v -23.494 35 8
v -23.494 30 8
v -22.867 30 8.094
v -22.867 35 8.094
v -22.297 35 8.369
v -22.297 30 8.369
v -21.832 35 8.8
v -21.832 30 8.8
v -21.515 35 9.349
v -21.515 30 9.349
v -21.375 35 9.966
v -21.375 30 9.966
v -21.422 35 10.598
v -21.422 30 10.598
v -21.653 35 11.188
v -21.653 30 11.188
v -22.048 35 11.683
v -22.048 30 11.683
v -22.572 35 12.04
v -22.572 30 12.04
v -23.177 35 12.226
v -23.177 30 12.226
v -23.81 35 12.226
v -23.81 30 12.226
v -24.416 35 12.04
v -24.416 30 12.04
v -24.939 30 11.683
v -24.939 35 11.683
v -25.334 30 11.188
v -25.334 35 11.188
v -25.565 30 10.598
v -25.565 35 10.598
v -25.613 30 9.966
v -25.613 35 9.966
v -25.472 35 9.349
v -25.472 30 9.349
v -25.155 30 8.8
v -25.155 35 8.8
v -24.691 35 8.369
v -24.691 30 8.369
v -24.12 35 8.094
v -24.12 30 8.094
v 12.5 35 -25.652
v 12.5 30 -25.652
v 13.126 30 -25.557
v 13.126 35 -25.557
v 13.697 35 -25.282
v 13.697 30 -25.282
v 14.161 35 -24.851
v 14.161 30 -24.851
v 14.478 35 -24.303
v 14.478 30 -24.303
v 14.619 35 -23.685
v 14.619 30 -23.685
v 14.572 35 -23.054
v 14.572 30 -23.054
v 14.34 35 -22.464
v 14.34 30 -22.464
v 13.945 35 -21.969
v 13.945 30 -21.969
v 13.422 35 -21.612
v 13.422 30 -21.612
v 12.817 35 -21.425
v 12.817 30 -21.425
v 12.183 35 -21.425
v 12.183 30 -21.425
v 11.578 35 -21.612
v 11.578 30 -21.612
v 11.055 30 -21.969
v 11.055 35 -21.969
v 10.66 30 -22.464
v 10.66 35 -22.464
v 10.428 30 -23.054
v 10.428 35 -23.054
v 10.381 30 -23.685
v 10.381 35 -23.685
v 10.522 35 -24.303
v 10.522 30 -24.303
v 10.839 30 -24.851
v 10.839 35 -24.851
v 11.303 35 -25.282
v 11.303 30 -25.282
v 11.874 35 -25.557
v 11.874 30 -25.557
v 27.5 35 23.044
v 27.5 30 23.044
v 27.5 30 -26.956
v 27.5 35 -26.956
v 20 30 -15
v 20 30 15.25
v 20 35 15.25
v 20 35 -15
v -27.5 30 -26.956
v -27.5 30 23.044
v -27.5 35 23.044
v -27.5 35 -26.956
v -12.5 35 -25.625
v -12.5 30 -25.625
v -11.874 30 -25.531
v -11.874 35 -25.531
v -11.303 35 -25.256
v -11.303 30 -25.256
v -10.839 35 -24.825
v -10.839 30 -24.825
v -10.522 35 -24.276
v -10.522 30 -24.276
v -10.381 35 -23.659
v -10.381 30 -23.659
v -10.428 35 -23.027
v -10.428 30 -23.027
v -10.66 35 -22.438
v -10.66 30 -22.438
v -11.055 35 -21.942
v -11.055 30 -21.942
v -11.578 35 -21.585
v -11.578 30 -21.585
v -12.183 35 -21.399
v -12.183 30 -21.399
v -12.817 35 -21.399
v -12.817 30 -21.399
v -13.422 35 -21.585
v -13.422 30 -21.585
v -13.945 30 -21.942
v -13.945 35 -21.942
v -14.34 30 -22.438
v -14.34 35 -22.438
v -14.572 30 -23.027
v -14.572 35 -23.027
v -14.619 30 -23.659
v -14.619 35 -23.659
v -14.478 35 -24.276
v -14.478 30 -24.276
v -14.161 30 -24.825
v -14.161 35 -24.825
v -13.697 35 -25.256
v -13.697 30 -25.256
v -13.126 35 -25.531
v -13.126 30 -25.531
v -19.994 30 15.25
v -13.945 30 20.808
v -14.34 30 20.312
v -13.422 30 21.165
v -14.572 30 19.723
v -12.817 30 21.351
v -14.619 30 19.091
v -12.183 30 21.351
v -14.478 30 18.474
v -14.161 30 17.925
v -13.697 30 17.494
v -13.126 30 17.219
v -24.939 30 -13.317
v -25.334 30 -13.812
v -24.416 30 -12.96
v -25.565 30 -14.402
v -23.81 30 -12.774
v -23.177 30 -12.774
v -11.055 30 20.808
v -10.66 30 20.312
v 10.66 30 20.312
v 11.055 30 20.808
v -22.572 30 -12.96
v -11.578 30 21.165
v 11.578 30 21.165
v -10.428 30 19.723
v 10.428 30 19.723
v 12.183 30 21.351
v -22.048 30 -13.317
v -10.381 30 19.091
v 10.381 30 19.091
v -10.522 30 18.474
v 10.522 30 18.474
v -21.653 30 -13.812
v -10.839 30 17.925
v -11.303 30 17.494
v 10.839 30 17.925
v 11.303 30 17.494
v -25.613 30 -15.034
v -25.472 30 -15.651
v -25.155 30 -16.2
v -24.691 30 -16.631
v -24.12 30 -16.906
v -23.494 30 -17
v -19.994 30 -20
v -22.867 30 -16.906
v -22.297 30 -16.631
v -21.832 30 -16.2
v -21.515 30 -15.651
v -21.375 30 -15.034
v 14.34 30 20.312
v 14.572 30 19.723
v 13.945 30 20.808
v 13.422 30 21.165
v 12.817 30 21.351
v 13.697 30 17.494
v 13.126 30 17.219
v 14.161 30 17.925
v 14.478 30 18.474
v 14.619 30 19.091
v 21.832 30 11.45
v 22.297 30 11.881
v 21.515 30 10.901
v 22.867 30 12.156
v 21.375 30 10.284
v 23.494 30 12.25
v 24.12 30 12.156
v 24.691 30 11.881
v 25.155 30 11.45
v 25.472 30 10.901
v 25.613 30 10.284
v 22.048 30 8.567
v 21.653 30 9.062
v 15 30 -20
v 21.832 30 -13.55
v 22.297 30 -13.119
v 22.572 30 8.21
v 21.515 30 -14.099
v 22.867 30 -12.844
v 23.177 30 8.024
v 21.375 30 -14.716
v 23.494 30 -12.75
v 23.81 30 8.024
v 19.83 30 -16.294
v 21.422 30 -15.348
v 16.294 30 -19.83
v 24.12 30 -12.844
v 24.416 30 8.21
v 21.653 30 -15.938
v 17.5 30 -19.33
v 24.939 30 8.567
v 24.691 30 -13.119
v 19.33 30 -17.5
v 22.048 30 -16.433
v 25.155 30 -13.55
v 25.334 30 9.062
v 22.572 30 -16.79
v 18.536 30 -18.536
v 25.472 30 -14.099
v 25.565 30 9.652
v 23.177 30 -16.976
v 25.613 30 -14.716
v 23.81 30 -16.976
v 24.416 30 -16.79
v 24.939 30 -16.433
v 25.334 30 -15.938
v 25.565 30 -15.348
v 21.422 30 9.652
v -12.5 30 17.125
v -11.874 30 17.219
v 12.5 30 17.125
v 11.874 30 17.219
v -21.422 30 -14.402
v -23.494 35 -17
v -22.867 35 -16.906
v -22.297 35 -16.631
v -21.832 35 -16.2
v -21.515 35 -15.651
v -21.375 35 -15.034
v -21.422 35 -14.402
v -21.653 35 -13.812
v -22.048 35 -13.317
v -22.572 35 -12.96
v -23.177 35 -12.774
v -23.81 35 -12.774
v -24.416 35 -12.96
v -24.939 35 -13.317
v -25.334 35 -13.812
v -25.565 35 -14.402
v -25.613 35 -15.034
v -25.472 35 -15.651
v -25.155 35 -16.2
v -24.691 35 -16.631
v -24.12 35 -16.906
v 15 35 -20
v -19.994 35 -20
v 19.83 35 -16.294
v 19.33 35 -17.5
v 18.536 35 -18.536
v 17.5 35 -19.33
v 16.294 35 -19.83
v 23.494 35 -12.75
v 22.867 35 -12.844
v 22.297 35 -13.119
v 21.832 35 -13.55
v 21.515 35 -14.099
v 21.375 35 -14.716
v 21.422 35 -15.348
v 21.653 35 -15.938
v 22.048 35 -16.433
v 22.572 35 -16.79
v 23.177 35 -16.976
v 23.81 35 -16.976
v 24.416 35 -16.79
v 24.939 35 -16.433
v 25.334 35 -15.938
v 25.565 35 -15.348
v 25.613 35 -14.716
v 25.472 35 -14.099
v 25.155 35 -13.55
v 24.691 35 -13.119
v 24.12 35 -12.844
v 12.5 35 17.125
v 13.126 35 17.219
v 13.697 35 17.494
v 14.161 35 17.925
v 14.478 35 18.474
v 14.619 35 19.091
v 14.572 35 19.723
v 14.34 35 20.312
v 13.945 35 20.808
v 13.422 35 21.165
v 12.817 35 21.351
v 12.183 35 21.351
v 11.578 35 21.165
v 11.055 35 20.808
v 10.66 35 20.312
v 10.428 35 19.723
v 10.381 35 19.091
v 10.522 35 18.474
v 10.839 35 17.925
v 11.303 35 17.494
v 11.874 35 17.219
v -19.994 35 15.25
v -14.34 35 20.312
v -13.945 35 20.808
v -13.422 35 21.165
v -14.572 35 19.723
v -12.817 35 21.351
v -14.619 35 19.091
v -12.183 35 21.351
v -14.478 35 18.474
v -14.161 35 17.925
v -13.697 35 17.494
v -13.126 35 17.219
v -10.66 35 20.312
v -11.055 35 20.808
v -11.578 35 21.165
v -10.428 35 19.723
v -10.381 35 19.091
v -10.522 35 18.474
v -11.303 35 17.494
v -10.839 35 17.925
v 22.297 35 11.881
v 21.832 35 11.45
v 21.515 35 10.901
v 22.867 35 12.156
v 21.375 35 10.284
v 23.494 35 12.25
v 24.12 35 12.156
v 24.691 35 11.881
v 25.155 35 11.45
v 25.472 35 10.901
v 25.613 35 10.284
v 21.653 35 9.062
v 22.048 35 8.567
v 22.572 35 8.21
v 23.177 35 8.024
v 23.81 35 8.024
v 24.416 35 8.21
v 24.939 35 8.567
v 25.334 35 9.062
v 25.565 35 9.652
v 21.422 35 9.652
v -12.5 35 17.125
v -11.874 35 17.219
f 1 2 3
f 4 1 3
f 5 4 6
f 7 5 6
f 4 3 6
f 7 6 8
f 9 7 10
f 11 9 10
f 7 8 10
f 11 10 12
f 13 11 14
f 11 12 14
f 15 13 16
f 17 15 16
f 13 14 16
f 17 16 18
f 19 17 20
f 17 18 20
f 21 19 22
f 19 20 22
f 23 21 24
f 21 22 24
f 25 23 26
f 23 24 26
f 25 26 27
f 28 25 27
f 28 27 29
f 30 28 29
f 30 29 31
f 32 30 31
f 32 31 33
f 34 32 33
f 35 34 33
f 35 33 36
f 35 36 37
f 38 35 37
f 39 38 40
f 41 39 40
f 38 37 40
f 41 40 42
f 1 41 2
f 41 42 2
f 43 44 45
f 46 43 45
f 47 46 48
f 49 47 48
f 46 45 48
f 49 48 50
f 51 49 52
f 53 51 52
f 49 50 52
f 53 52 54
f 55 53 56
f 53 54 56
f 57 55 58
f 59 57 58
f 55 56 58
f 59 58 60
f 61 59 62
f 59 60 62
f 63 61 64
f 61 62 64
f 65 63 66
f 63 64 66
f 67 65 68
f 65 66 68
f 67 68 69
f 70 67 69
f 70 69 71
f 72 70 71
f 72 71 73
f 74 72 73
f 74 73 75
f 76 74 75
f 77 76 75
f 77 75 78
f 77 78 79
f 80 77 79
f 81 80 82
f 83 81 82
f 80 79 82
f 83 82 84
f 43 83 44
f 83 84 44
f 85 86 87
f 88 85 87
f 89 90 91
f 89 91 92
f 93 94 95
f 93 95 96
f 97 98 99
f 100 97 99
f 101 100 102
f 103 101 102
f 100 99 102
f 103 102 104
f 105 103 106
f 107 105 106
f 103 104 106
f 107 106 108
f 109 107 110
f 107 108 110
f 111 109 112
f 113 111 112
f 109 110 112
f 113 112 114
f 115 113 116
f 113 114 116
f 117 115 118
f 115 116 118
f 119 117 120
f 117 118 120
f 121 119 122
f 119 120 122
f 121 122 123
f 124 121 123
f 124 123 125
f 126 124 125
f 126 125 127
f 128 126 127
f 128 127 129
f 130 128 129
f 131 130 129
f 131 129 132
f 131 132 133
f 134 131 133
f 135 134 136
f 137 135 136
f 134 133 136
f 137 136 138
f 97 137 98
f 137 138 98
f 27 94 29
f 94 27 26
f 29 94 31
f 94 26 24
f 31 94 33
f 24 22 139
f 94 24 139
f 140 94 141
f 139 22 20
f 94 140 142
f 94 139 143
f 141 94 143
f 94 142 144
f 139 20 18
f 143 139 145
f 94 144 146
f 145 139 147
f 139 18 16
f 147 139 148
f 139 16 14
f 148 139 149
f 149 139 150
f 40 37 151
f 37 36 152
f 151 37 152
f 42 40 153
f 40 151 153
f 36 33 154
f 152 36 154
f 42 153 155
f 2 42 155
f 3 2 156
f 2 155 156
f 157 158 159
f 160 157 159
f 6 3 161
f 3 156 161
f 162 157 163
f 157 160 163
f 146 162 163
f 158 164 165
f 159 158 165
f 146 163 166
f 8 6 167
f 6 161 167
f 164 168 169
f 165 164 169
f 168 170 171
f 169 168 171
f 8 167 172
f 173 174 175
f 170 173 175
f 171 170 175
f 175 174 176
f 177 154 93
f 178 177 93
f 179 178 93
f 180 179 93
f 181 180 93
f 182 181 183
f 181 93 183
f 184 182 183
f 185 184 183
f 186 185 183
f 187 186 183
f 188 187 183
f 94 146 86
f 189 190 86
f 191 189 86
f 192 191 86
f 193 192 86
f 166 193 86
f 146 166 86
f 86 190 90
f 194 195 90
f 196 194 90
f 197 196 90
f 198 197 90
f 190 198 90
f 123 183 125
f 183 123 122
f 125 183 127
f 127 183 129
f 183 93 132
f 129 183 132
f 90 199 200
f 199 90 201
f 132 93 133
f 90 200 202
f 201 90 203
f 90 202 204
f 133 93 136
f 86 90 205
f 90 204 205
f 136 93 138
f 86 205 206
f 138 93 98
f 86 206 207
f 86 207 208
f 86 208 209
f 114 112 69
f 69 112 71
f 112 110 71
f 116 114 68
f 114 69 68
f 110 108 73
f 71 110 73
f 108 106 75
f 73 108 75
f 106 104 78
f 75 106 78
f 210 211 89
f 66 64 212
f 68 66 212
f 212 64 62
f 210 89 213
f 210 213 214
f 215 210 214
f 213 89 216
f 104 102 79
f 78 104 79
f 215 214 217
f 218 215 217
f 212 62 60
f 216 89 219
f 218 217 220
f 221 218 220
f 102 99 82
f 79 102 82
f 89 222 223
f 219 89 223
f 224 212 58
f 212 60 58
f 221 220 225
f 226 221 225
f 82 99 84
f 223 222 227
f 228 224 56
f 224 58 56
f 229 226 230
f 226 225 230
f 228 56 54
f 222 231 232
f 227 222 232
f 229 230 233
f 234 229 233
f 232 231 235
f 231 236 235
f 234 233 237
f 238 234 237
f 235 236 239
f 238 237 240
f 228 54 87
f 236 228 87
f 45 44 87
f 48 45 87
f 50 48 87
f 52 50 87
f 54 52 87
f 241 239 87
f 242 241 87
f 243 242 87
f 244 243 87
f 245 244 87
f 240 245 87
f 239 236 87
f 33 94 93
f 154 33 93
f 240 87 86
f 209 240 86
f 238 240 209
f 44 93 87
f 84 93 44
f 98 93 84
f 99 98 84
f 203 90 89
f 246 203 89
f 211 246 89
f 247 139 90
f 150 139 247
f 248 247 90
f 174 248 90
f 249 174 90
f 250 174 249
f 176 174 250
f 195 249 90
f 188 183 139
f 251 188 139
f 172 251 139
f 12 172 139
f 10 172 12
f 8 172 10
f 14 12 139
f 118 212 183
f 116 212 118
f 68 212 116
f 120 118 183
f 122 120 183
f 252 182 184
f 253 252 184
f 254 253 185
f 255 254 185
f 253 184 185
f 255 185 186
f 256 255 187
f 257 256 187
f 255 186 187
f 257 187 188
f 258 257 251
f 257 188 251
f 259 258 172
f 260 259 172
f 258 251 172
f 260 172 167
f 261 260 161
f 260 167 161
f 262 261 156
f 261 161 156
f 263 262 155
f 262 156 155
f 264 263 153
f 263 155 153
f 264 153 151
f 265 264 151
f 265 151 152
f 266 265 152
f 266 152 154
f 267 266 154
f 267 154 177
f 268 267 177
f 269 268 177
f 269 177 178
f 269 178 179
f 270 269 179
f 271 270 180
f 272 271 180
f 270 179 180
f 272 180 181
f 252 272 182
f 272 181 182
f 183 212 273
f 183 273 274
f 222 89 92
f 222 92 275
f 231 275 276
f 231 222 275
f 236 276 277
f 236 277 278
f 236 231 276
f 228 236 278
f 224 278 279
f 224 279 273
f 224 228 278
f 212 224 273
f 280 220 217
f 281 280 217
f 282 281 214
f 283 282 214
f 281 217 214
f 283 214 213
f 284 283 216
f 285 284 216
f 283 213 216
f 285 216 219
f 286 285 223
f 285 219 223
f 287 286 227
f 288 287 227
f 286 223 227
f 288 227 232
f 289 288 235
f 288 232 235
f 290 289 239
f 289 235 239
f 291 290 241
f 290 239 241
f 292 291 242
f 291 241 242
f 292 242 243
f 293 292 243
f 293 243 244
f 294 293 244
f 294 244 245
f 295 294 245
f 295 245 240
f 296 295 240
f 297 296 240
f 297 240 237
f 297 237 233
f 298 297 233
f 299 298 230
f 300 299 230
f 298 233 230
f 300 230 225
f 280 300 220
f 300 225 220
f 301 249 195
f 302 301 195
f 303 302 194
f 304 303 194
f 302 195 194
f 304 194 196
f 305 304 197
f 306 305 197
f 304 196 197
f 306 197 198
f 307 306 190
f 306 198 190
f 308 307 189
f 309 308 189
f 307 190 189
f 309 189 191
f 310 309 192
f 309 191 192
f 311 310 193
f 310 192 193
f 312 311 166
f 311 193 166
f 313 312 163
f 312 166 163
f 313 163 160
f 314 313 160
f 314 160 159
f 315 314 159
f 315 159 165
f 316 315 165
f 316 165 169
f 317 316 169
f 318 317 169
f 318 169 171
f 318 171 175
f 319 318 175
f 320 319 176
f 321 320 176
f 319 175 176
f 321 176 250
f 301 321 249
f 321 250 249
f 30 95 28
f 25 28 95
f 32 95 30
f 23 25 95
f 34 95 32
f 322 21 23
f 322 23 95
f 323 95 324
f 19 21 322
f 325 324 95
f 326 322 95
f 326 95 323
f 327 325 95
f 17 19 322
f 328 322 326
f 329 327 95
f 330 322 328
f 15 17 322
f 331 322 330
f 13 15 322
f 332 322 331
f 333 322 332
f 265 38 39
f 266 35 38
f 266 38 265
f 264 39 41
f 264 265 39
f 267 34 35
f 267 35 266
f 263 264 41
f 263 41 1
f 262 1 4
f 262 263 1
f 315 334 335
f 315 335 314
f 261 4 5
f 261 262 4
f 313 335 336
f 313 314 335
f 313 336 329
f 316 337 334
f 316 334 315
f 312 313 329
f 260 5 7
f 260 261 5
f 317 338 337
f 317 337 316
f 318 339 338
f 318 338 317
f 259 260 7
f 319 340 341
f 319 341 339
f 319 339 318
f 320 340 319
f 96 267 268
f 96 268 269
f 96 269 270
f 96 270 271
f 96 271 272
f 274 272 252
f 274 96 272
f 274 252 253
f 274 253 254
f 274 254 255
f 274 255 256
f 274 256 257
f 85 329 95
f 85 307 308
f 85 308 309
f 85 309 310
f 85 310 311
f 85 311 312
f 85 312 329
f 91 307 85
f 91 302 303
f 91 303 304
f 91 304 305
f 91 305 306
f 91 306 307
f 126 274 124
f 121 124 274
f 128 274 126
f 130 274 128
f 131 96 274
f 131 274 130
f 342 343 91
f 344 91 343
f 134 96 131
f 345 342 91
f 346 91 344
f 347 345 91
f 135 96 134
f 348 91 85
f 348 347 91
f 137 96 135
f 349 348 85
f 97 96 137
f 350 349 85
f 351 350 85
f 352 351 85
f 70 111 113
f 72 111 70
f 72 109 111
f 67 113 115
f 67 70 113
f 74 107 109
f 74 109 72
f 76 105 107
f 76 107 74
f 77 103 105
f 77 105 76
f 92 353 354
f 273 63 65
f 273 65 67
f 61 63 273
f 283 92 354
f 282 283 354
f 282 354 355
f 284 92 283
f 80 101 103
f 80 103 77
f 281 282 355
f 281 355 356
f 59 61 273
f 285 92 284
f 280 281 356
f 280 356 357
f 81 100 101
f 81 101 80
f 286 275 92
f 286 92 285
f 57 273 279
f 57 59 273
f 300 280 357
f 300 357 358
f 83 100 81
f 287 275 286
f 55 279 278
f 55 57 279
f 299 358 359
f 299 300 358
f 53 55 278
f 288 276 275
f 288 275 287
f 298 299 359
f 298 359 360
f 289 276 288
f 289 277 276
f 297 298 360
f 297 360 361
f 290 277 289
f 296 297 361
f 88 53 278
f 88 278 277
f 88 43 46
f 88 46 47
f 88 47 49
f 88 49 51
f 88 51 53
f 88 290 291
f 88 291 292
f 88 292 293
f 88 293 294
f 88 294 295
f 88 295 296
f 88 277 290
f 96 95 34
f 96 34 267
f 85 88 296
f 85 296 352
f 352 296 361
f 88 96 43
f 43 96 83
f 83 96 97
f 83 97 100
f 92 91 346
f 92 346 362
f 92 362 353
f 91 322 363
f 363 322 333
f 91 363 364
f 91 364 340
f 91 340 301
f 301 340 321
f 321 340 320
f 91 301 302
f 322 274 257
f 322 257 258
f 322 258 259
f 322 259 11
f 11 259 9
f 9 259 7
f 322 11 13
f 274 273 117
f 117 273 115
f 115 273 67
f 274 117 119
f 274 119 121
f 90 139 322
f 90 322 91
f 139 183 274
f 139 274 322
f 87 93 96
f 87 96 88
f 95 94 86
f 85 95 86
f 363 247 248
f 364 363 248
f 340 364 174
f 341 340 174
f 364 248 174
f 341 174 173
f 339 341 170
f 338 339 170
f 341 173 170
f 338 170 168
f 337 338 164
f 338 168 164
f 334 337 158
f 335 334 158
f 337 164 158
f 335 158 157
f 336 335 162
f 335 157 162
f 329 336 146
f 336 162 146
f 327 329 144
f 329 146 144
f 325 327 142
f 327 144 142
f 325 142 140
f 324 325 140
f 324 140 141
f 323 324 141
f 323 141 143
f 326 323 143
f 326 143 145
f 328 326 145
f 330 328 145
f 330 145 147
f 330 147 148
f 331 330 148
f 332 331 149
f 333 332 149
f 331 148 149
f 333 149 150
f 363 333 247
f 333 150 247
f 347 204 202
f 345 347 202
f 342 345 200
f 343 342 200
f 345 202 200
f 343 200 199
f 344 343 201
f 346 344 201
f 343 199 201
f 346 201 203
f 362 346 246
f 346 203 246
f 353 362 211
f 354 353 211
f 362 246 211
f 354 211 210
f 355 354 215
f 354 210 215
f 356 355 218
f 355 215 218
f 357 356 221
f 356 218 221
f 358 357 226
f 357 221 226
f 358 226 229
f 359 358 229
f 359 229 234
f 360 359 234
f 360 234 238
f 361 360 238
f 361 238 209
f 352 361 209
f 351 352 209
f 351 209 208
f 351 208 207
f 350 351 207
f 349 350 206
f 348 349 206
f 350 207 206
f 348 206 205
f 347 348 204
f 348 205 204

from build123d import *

# Parameters (mm, degrees)
CROQUIS1_R                              = 15.25
CROQUIS1_R_2                            = 2.125
SOPORTE_CAJA_REDUCTORA_DEPTH            = 20
CROQUIS3_R                              = 2.125
CORTAR_EXTRUIR1_DEPTH                   = 51.423828692
REDONDEO1_R                             = 5
BOSS_EXTRUDE1_DEPTH                     = 20
CUT_EXTRUDE1_REACH                      = 55.852
SKETCH2_R                               = 1.625
CUT_EXTRUDE2_DEPTH                      = 2
SKETCH4_R                               = 1.625
CUT_EXTRUDE3_DEPTH                      = 63.291652731
CUT_EXTRUDE4_START                      = -4.5
CUT_EXTRUDE4_DEPTH                      = 2
CROQUIS6_W                              = 4.75
CROQUIS6_H                              = 4.75
CORTAR_EXTRUIR17_DEPTH                  = 42.231056256
CROQUIS7_W                              = 60
CROQUIS7_H                              = 20
CORTAR_EXTRUIR18_DEPTH                  = 51.423828692
SALIENTE_EXTRUIR2_DEPTH                 = 49
SOPORTE_START                           = -15
SOPORTE_MOTOR_DEPTH                     = 15
CROQUIS12_R                             = 2.125
AGUJEROS_DE_SUJECION_A_BASE_DEPTH       = 84.087679592
TUERCA_START                            = -4
TUERCA_AGUJERO_DE_SUJECION_A_BASE_DEPTH = 10
SALIENTE_EXTRUIR4_DEPTH                 = 15
CORTAR_EXTRUIR19_DEPTH                  = 25
CROQUIS14_W                             = 50
CROQUIS14_H                             = 118
CORTAR_EXTRUIR22_DEPTH                  = 146.556045907
CROQUIS15_W                             = 10
CROQUIS15_H                             = 7
CORTAR_EXTRUIR23_DEPTH                  = 42.231056256
CORTAR_EXTRUIR24_DEPTH                  = 42.231056256
CROQUIS18_W                             = 40
CROQUIS18_H                             = 10
CORTAR_EXTRUIR25_DEPTH                  = 44.27311521
SALIENTE_EXTRUIR5_DEPTH                 = 10
CROQUIS20_R                             = 1
CORTAR_EXTRUIR26_DEPTH                  = 49.229270158
CORTAR_EXTRUIR27_REACH                  = 62.959
CORTAR_EXTRUIR27_END_RADIUS             = 15.25
CROQUIS21_R                             = 1.625
CROQUIS22_R                             = 2.125
CROQUIS22_R_2                           = 1
SALIENTE_EXTRUIR6_DEPTH                 = 10
CROQUIS23_R                             = 1.625
CORTAR_EXTRUIR28_DEPTH                  = 52.269508521
CORTAR_EXTRUIR29_START                  = -3
CORTAR_EXTRUIR29_DEPTH                  = 10
SALIENTE_EXTRUIR7_DEPTH                 = 10
CORTAR_EXTRUIR30_REACH                  = 72.235
CROQUIS27_R                             = 1.625
CORTAR_EXTRUIR31_REACH                  = 75.235
CORTAR_EXTRUIR31_START                  = -3
CORTAR_EXTRUIR32_REACH                  = 58.612
CROQUIS29_R                             = 1.625
CORTAR_EXTRUIR33_REACH                  = 61.112
CORTAR_EXTRUIR33_START                  = -2.5
CROQUIS35_W                             = 13.305418987
CROQUIS35_H                             = 6.826864192
CORTAR_EXTRUIR34_DEPTH                  = 63.931555098
CORTAR_EXTRUIR34_DEPTH_BACK             = 63.931555098
CORTAR_EXTRUIR35_START                  = -3
CORTAR_EXTRUIR35_DEPTH                  = 10
SALIENTE_EXTRUIR8_DEPTH                 = 10
SALIENTE_EXTRUIR9_DEPTH                 = 13
SALIENTE_EXTRUIR10_DEPTH                = 3
CROQUIS40_W                             = 106.583537839
CROQUIS40_H                             = 47.391515964
CORTAR_EXTRUIR36_DEPTH                  = 80.887064817
CORTAR_EXTRUIR36_DEPTH_BACK             = 80.887064817
CORTAR_EXTRUIR37_DEPTH                  = 67.2524009
CORTAR_EXTRUIR37_DEPTH_BACK             = 67.2524009
CORTAR_EXTRUIR38_DEPTH                  = 79.704784639
CORTAR_EXTRUIR38_DEPTH_BACK             = 79.704784639
SALIENTE_EXTRUIR11_DEPTH                = 10
CORTAR_EXTRUIR39_DEPTH                  = 63.9908649
CROQUIS45_W                             = 31.470301378
CROQUIS45_H                             = 10
CROQUIS45_R                             = 1.625
SALIENTE_EXTRUIR12_DEPTH                = 2.5
SALIENTE_EXTRUIR13_DEPTH                = 10
CORTAR_EXTRUIR40_START                  = -2
CROQUIS47_R                             = 1.625
CORTAR_EXTRUIR40_DEPTH                  = 10
CORTAR_EXTRUIR41_START                  = -12
CROQUIS48_R                             = 1.625
CORTAR_EXTRUIR41_DEPTH                  = 12
CROQUIS49_W                             = 34.796066513
CROQUIS49_H                             = 42.211026982
CORTAR_EXTRUIR42_DEPTH                  = 52.795622989
CORTAR_EXTRUIR42_DEPTH_BACK             = 52.795622989
CROQUIS51_R                             = 15.25
CROQUIS51_R_2                           = 14.25
SALIENTE_EXTRUIR14_DEPTH                = 10
CORTAR_EXTRUIR43_DEPTH                  = 10
CORTAR_EXTRUIR44_DEPTH                  = 10
CORTAR_EXTRUIR45_DEPTH                  = 10
SALIENTE_EXTRUIR15_DEPTH                = 10
CROQUIS56_W                             = 55
CROQUIS56_H                             = 50
SALIENTE_EXTRUIR16_DEPTH                = 5
CROQUIS57_W                             = 42.651963039
CROQUIS57_H                             = 12.802181648
CORTAR_EXTRUIR46_DEPTH                  = 71.545387859
CORTAR_EXTRUIR46_DEPTH_BACK             = 71.545387859
CROQUIS58_R                             = 2.125
CORTAR_EXTRUIR47_DEPTH                  = 5


with BuildPart() as part:
    # Croquis1 → Soporte caja reductora (new body)
    with BuildSketch(Plane(origin=(0, 0, 0), x_dir=(1, 0, 0), z_dir=(0, 1, 0))):
        Polygon((-30, -15.25), (-20, -15.25), (-20, -20), (20, -20), (20, -15.25), (30, -15.25), (30, -7.25), (20, -4.25), (20, 20), (-20, 20), (-20, -4.25), (-30, -7.25), align=None)
        with Locations(Location((0, 0, 0), (0, 0, 270))):
            Circle(CROQUIS1_R, mode=Mode.SUBTRACT)
        with Locations(Location((-15, 15, 0), (0, 0, 270))):
            Circle(CROQUIS1_R_2, mode=Mode.SUBTRACT)
        with Locations(Location((15, 15, 0), (0, 0, 270))):
            Circle(CROQUIS1_R_2, mode=Mode.SUBTRACT)
    extrude(amount=-SOPORTE_CAJA_REDUCTORA_DEPTH)

    # Croquis3 → Cortar-Extruir1 (cut, through all)
    with BuildSketch(Plane.XY.offset(15.25)):
        with Locations((-23.5, -10)):
            Circle(CROQUIS3_R)
        with Locations((23.5, -10)):
            Circle(CROQUIS3_R)
    extrude(amount=-CORTAR_EXTRUIR1_DEPTH, mode=Mode.SUBTRACT)

    # Redondeo1
    redondeo1_edges = [part.edges().sort_by_distance(p)[0] for p in [
        (-20, -10, -20),
        (20, -10, -20),
    ]]
    fillet(redondeo1_edges, radius=REDONDEO1_R)

    # Sketch1 → Boss-Extrude1 (add)
    with BuildSketch(Plane(origin=(0, 0, 0), x_dir=(1, 0, 0), z_dir=(0, 1, 0))):
        with BuildLine():
            Line((25.5, 15), (20, 15))
            ThreePointArc((20, 15), (18.535533906, 18.535533906), (15, 20))
            Line((15, 20), (30, 20))
            Line((30, 20), (30, 8))
            Line((30, 8), (25.5, 8))
            Line((25.5, 8), (25.5, 15))
        make_face()
    extrude(amount=-BOSS_EXTRUDE1_DEPTH)

    # Sketch2 → Cut-Extrude1 (cut, up to next)
    with BuildSketch(Plane(origin=(0, 0, -20), x_dir=(-1, 0, 0), z_dir=(0, 0, -1)), mode=Mode.PRIVATE) as cut_extrude1_sk1:
        with Locations((-22.75, -10)):
            Circle(SKETCH2_R)
    cut_extrude1_tool1 = extrude(cut_extrude1_sk1.sketch, amount=-CUT_EXTRUDE1_REACH, mode=Mode.PRIVATE) & part.part
    add(cut_extrude1_tool1.solids().sort_by_distance((22.75, -10, -20))[0], mode=Mode.SUBTRACT)

    # Sketch3 → Cut-Extrude2 (cut)
    with BuildSketch(Plane.XY.offset(-15)):
        Polygon((20, -11.58771324), (22.75, -13.175426481), (25.5, -11.58771324), (25.5, -8.41228676), (22.75, -6.824573519), (20, -8.41228676), align=None)
    extrude(amount=-CUT_EXTRUDE2_DEPTH, mode=Mode.SUBTRACT)

    # Sketch4 → Cut-Extrude3 (cut, through all)
    with BuildSketch(Plane.ZY.offset(-25.5)):
        with Locations((-12.25, -10)):
            Circle(SKETCH4_R)
    extrude(amount=-CUT_EXTRUDE3_DEPTH, mode=Mode.SUBTRACT)

    # Sketch5 → Cut-Extrude4 (cut)
    with BuildSketch(Plane(origin=(30, 0, 0), x_dir=(0, 0, -1), z_dir=(1, 0, 0)).offset(CUT_EXTRUDE4_START)):
        Polygon((15, -11.58771324), (15, -8.41228676), (12.25, -6.824573519), (9.5, -8.41228676), (9.5, -11.58771324), (12.25, -13.175426481), align=None)
    extrude(amount=CUT_EXTRUDE4_DEPTH, mode=Mode.SUBTRACT)

    # Croquis6 → Cortar-Extruir17 (cut, through all)
    with BuildSketch(Plane(origin=(0, 0, 0), x_dir=(1, 0, 0), z_dir=(0, 1, 0))):
        Polygon((0, -15.25), (-15.25, -15.25), (-15.25, -20), (15.25, -20), (15.25, -15.25), align=None)
        with Locations((-17.625, -17.625)):
            Rectangle(CROQUIS6_W, CROQUIS6_H)
        with BuildLine():
            ThreePointArc((0, -15.25), (-10.783378413, -10.783378413), (-15.25, 0))
            Line((-15.25, 0), (-15.25, -15.25))
            Line((-15.25, -15.25), (0, -15.25))
        make_face()
        with BuildLine():
            Line((15.25, -15.25), (15.25, 0))
            ThreePointArc((15.25, 0), (10.783378413, -10.783378413), (0, -15.25))
            Line((0, -15.25), (15.25, -15.25))
        make_face()
        with Locations((17.625, -17.625)):
            Rectangle(CROQUIS6_W, CROQUIS6_H)
    extrude(amount=-CORTAR_EXTRUIR17_DEPTH, mode=Mode.SUBTRACT)


with BuildPart() as body_2:
    # Simetría1: mirrored copy
    add(part.part.mirror(Plane.ZX))

    # Croquis8 → Saliente-Extruir2 (add)
    with BuildSketch(Plane(origin=(0, 20, 0), x_dir=(1, 0, 0), z_dir=(0, 1, 0))):
        with BuildLine():
            Line((-12.664515522, 20), (-11.040489496, 13.939052358))
            Line((-11.040489496, 13.939052358), (-10.315162126, 11.232093763))
            ThreePointArc((-10.315162126, 11.232093763), (0, 15.25), (10.315162126, 11.232093763))
            Line((10.315162126, 11.232093763), (10.817418481, 13.87928066))
            Line((10.817418481, 13.87928066), (11.978715476, 20))
            Line((11.978715476, 20), (-12.664515522, 20))
        make_face()
    extrude(amount=SALIENTE_EXTRUIR2_DEPTH)

    # Croquis9 → Soporte motor (add)
    with BuildSketch(Plane(origin=(0, 69, 0), x_dir=(1, 0, 0), z_dir=(0, 1, 0)).offset(SOPORTE_START)):
        with BuildLine():
            Line((-20, 15), (-20, -4.25))
            Line((-20, -4.25), (-30, -7.25))
            Line((-30, -7.25), (-30, -15.25))
            Line((-30, -15.25), (0, -15.25))
            Line((0, -15.25), (0, -14.75))
            ThreePointArc((0, -14.75), (-10.429825023, 10.429825023), (14.75, 0))
            Line((14.75, 0), (20, 0))
            Line((20, 0), (20, 13.936837101))
            Line((20, 13.936837101), (12.664515522, 20))
            Line((12.664515522, 20), (-15, 20))
            ThreePointArc((-15, 20), (-18.535533906, 18.535533906), (-20, 15))
        make_face()
    extrude(amount=-SOPORTE_MOTOR_DEPTH)

    # Croquis12 → Agujeros de sujecion a base (cut, through all)
    with BuildSketch(Plane.XY.offset(15.25)):
        with Locations((-23.5, 46.5)):
            Circle(CROQUIS12_R)
    extrude(amount=-AGUJEROS_DE_SUJECION_A_BASE_DEPTH, mode=Mode.SUBTRACT)

    # Croquis13 → Tuerca Agujero de sujecion a base (cut)
    with BuildSketch(Plane.XY.offset(15.25).offset(TUERCA_START)):
        Polygon((-20, 44.479274058), (-20, 48.520725942), (-23.5, 50.541451884), (-27, 48.520725942), (-27, 44.479274058), (-23.5, 42.458548116), align=None)
    extrude(amount=-TUERCA_AGUJERO_DE_SUJECION_A_BASE_DEPTH, mode=Mode.SUBTRACT)

    # Croquis10 → Saliente-Extruir4 (add)
    with BuildSketch(Plane(origin=(0, 69, 0), x_dir=(1, 0, 0), z_dir=(0, 1, 0))):
        with BuildLine():
            ThreePointArc((10.315162126, 11.232093763), (0, 15.25), (-10.315162126, 11.232093763))
            Line((-10.315162126, 11.232093763), (-10.16850369, 10.684757026))
            ThreePointArc((-10.16850369, 10.684757026), (0, 14.75), (10.16850369, 10.684757026))
            Line((10.16850369, 10.684757026), (10.315162126, 11.232093763))
        make_face()
    extrude(amount=-SALIENTE_EXTRUIR4_DEPTH)

    # Croquis11 → Cortar-Extruir19 (cut)
    with BuildSketch(Plane.XZ):
        with BuildLine():
            Line((15.25, 4.25), (20, 4.25))
            Line((20, 4.25), (21.972856468, 4.84185694))
            ThreePointArc((21.972856468, 4.84185694), (19.948931102, 10.40625523), (16.543503257, 15.25))
            Line((16.543503257, 15.25), (15.25, 15.25))
            Line((15.25, 15.25), (15.25, 4.25))
        make_face()
        with BuildLine():
            Line((21.972856468, 4.84185694), (30, 7.25))
            Line((30, 7.25), (30, 15.25))
            Line((30, 15.25), (16.543503257, 15.25))
            ThreePointArc((16.543503257, 15.25), (19.948931102, 10.40625523), (21.972856468, 4.84185694))
        make_face()
        with BuildLine():
            ThreePointArc((20, -15), (18.535533906, -18.535533906), (15, -20))
            Line((15, -20), (30, -20))
            Line((30, -20), (30, -8))
            Line((30, -8), (25.5, -8))
            Line((25.5, -8), (25.5, -15))
            Line((25.5, -15), (20, -15))
        make_face()
    extrude(amount=-CORTAR_EXTRUIR19_DEPTH, mode=Mode.SUBTRACT)

    # Simetría2: body 2 across face


with BuildPart() as part_1:
    add(part.part)

    # Croquis7 → Cortar-Extruir18 (cut, through all)
    with BuildSketch(Plane(origin=(0, 0, -20), x_dir=(-1, 0, 0), z_dir=(0, 0, -1))):
        with Locations((0, -10)):
            Rectangle(CROQUIS7_W, CROQUIS7_H)
    extrude(amount=-CORTAR_EXTRUIR18_DEPTH, mode=Mode.SUBTRACT)


with BuildPart() as body_2_1:
    add(body_2.part)
    add(body_2.part.mirror(Plane(origin=(-0.229209569, 69, -16.663998028), x_dir=(0, 0, 1), z_dir=(0, 1, 0))))

    # Croquis14 → Cortar-Extruir22 (cut, through all)
    with BuildSketch(Plane.XY.offset(15.25)):
        with Locations((-5, 79)):
            Rectangle(CROQUIS14_W, CROQUIS14_H)
    extrude(amount=-CORTAR_EXTRUIR22_DEPTH, mode=Mode.SUBTRACT)

    # Croquis15 → Cortar-Extruir23 (cut, through all)
    with BuildSketch(Plane.XZ):
        with Locations((-25, 7.75)):
            Rectangle(CROQUIS15_W, CROQUIS15_H)
    extrude(amount=-CORTAR_EXTRUIR23_DEPTH, mode=Mode.SUBTRACT)

    # Croquis16 → Cortar-Extruir24 (cut, through all)
    with BuildSketch(Plane.XZ):
        Polygon((-30, 15.25), (-15.25, 15.25), (-15.25, 12.75), (-20, 12.75), (-20, 11.25), (-30, 11.25), (-30, 12.75), align=None)
    extrude(amount=-CORTAR_EXTRUIR24_DEPTH, mode=Mode.SUBTRACT)

    # Croquis18 → Cortar-Extruir25 (cut, through all)
    with BuildSketch(Plane(origin=(0, 0, -20), x_dir=(-1, 0, 0), z_dir=(0, 0, -1))):
        with Locations((0, 5)):
            Rectangle(CROQUIS18_W, CROQUIS18_H)
    extrude(amount=-CORTAR_EXTRUIR25_DEPTH, mode=Mode.SUBTRACT)

    # Croquis19 → Saliente-Extruir5 (add)
    with BuildSketch(Plane(origin=(0, 20, 0), x_dir=(1, 0, 0), z_dir=(0, 1, 0))):
        Polygon((-20, -12.75), (-34, -12.75), (-34, -7.75), (-24, -7.75), (-20, -3.75), align=None)
    extrude(amount=-SALIENTE_EXTRUIR5_DEPTH)

    # Croquis20 → Cortar-Extruir26 (cut, through all)
    with BuildSketch(Plane(origin=(0, 0, 7.75), x_dir=(-1, 0, 0), z_dir=(0, 0, -1))):
        with Locations((29, 15)):
            Circle(CROQUIS20_R)
    extrude(amount=-CORTAR_EXTRUIR26_DEPTH, mode=Mode.SUBTRACT)

    # Cortar-Extruir27: up to this cylinder (the profile starts outside it)
    cortar_extruir27_end = Plane(origin=(0, 15, 0), z_dir=(0, -1, 0)) * Cylinder(CORTAR_EXTRUIR27_END_RADIUS, 157.418, mode=Mode.PRIVATE)
    # Croquis21 → Cortar-Extruir27 (cut, up to the surface)
    with BuildSketch(Plane(origin=(20, 0, 0), x_dir=(0, 0, -1), z_dir=(1, 0, 0)), mode=Mode.PRIVATE) as cortar_extruir27_sk1:
        with Locations((4.75, 15)):
            Circle(CROQUIS21_R)
    cortar_extruir27_tool1 = extrude(cortar_extruir27_sk1.sketch, amount=-CORTAR_EXTRUIR27_REACH, mode=Mode.PRIVATE) - cortar_extruir27_end
    add(cortar_extruir27_tool1.solids().sort_by_distance((20, 15, -4.75))[0], mode=Mode.SUBTRACT)

    # Croquis22 → Saliente-Extruir6 (add)
    with BuildSketch(Plane.XZ.offset(-10)):
        with Locations((-15, -15)):
            Circle(CROQUIS22_R)
        with Locations(Location((-15, -15, 0), (0, 0, 270))):
            Circle(CROQUIS22_R_2, mode=Mode.SUBTRACT)
        with Locations((15, -15)):
            Circle(CROQUIS22_R)
        with Locations(Location((15, -15, 0), (0, 0, 270))):
            Circle(CROQUIS22_R_2, mode=Mode.SUBTRACT)
    extrude(amount=-SALIENTE_EXTRUIR6_DEPTH)

    # Croquis23 → Cortar-Extruir28 (cut, through all)
    with BuildSketch(Plane(origin=(0, 0, -20), x_dir=(-1, 0, 0), z_dir=(0, 0, -1))):
        with Locations((0, 15)):
            Circle(CROQUIS23_R)
    extrude(amount=-CORTAR_EXTRUIR28_DEPTH, mode=Mode.SUBTRACT)

    # Croquis24 → Cortar-Extruir29 (cut)
    with BuildSketch(Plane(origin=(0, 0, -20), x_dir=(-1, 0, 0), z_dir=(0, 0, -1)).offset(CORTAR_EXTRUIR29_START)):
        Polygon((1.58771324, 12.25), (3.175426481, 15), (1.58771324, 17.75), (-1.58771324, 17.75), (-3.175426481, 15), (-1.58771324, 12.25), align=None)
    extrude(amount=-CORTAR_EXTRUIR29_DEPTH, mode=Mode.SUBTRACT)

    # Croquis26 → Saliente-Extruir7 (add)
    with BuildSketch(Plane.XZ.offset(-10)):
        Polygon((-34, 7.75), (-34, 12.75), (-58.825, 12.75), (-39.160527763, -4.104491148), (-20, -4.104491148), (-20, -0.104491148), (-35.732113118, -0.104491148), (-29, 7.75), align=None)
        Polygon((-34.268209086, 7.75), (-39.594516123, 1.535690951), (-46.844874897, 7.75), align=None, mode=Mode.SUBTRACT)
    extrude(amount=-SALIENTE_EXTRUIR7_DEPTH)

    # Croquis27 → Cortar-Extruir30 (cut, up to next)
    with BuildSketch(Plane.XY.offset(12.75), mode=Mode.PRIVATE) as cortar_extruir30_sk1:
        with Locations((-40.544874897, 15)):
            Circle(CROQUIS27_R)
    cortar_extruir30_tool1 = extrude(cortar_extruir30_sk1.sketch, amount=-CORTAR_EXTRUIR30_REACH, mode=Mode.PRIVATE) & body_2_1.part
    # Croquis27 → Cortar-Extruir30 (cut, up to next)
    with BuildSketch(Plane.XY.offset(12.75), mode=Mode.PRIVATE) as cortar_extruir30_sk2:
        with Locations((-29, 15)):
            Circle(CROQUIS27_R)
    cortar_extruir30_tool2 = extrude(cortar_extruir30_sk2.sketch, amount=-CORTAR_EXTRUIR30_REACH, mode=Mode.PRIVATE) & body_2_1.part
    add(cortar_extruir30_tool1.solids().sort_by_distance((-40.544875, 15, 12.75))[0], mode=Mode.SUBTRACT)
    add(cortar_extruir30_tool2.solids().sort_by_distance((-29, 15, 12.75))[0], mode=Mode.SUBTRACT)

    # Croquis28 → Cortar-Extruir31 (cut, up to next)
    with BuildSketch(Plane.XY.offset(12.75).offset(CORTAR_EXTRUIR31_START), mode=Mode.PRIVATE) as cortar_extruir31_sk1:
        Polygon((-38.957161657, 12.25), (-37.369448416, 15), (-38.957161657, 17.75), (-42.132588137, 17.75), (-43.720301378, 15), (-42.132588137, 12.25), align=None)
    cortar_extruir31_tool1 = extrude(cortar_extruir31_sk1.sketch, amount=-CORTAR_EXTRUIR31_REACH, mode=Mode.PRIVATE) & body_2_1.part
    # Croquis28 → Cortar-Extruir31 (cut, up to next)
    with BuildSketch(Plane.XY.offset(12.75).offset(CORTAR_EXTRUIR31_START), mode=Mode.PRIVATE) as cortar_extruir31_sk2:
        Polygon((-27.41228676, 12.25), (-25.824573519, 15), (-27.41228676, 17.75), (-30.58771324, 17.75), (-32.175426481, 15), (-30.58771324, 12.25), align=None)
    cortar_extruir31_tool2 = extrude(cortar_extruir31_sk2.sketch, amount=-CORTAR_EXTRUIR31_REACH, mode=Mode.PRIVATE) & body_2_1.part
    add(cortar_extruir31_tool1.solids().sort_by_distance((-40.544875, 15, 9.75))[0], mode=Mode.SUBTRACT)
    add(cortar_extruir31_tool2.solids().sort_by_distance((-29, 15, 9.75))[0], mode=Mode.SUBTRACT)

    # Croquis29 → Cortar-Extruir32 (cut, up to next)
    with BuildSketch(Plane(origin=(-18.612848159, 0, -21.715982563), x_dir=(-0.7592713073348843, 0, 0.6507742172658468), z_dir=(-0.6507742172658468, 0, -0.7592713073348843)), mode=Mode.PRIVATE) as cortar_extruir32_sk1:
        with Locations((33.812368097, 15)):
            Circle(CROQUIS29_R)
    cortar_extruir32_tool1 = extrude(cortar_extruir32_sk1.sketch, amount=-CORTAR_EXTRUIR32_REACH, mode=Mode.PRIVATE) & body_2_1.part
    add(cortar_extruir32_tool1.solids().sort_by_distance((-44.285609, 15, 0.288235))[0], mode=Mode.SUBTRACT)

    # Croquis31 → Cortar-Extruir33 (cut, up to next)
    with BuildSketch(Plane(origin=(-18.612848159, 0, -21.715982563), x_dir=(-0.7592713073348843, 0, 0.6507742172658468), z_dir=(-0.6507742172658468, 0, -0.7592713073348843)).offset(CORTAR_EXTRUIR33_START), mode=Mode.PRIVATE) as cortar_extruir33_sk1:
        Polygon((36.562368097, 16.58771324), (33.812368097, 18.175426481), (31.062368097, 16.58771324), (31.062368097, 13.41228676), (33.812368097, 11.824573519), (36.562368097, 13.41228676), align=None)
    cortar_extruir33_tool1 = extrude(cortar_extruir33_sk1.sketch, amount=-CORTAR_EXTRUIR33_REACH, mode=Mode.PRIVATE) & body_2_1.part
    add(cortar_extruir33_tool1.solids().sort_by_distance((-42.658674, 15, 2.186413))[0], mode=Mode.SUBTRACT)

    # Croquis35 → Cortar-Extruir34 (cut, two sides)
    with BuildSketch(Plane(origin=(0, 20, 0), x_dir=(1, 0, 0), z_dir=(0, 1, 0))) as cortar_extruir34_sk:
        with Locations((17.04227466, -3.413432096)):
            Rectangle(CROQUIS35_W, CROQUIS35_H)
    extrude(amount=CORTAR_EXTRUIR34_DEPTH, mode=Mode.SUBTRACT)
    extrude(cortar_extruir34_sk.sketch, amount=-CORTAR_EXTRUIR34_DEPTH_BACK, mode=Mode.SUBTRACT)

    # Croquis36 → Cortar-Extruir35 (cut)
    with BuildSketch(Plane(origin=(20, 0, 0), x_dir=(0, 0, -1), z_dir=(1, 0, 0)).offset(CORTAR_EXTRUIR35_START)):
        Polygon((7.5, 16.58771324), (4.75, 18.175426481), (2, 16.58771324), (2, 13.41228676), (4.75, 11.824573519), (7.5, 13.41228676), align=None)
    extrude(amount=-CORTAR_EXTRUIR35_DEPTH, mode=Mode.SUBTRACT)

    # Croquis37 → Saliente-Extruir8 (add)
    with BuildSketch(Plane.XZ.offset(-10)):
        Polygon((-39.160527763, -4.104491148), (-20.614919368, -20), (-15, -20), (-19.558128305, -15.637570403), (-33.014002756, -4.104491148), align=None)
    extrude(amount=-SALIENTE_EXTRUIR8_DEPTH)

    # Croquis38 → Saliente-Extruir9 (add)
    with BuildSketch(Plane.XZ.offset(-10)):
        Polygon((-58.825, 12.75), (-38.825, 12.75), (-38.825, 9.75), (-55.324839942, 9.75), align=None)
    extrude(amount=SALIENTE_EXTRUIR9_DEPTH)

    # Croquis39 → Saliente-Extruir10 (add)
    with BuildSketch(Plane.XZ.offset(-10)):
        Polygon((-38.825, 9.75), (-38.825, 7.75), (-38.825, 5.75), (-50.657959865, 5.75), (-52.991399903, 7.75), (-55.324839942, 9.75), align=None)
    extrude(amount=SALIENTE_EXTRUIR10_DEPTH)

    # Simetría3: body 2 across face


with BuildPart() as body_2_2:
    add(body_2_1.part)
    add(body_2_1.part.mirror(Plane(origin=(-18.003999227, 20, -4.220503046), x_dir=(0, 0, 1), z_dir=(0, 1, 0))))

    # Croquis40 → Cortar-Extruir36 (cut, two sides)
    with BuildSketch(Plane(origin=(0, 0, -20), x_dir=(-1, 0, 0), z_dir=(0, 0, -1))) as cortar_extruir36_sk:
        with Locations((22.395502026, -3.695757982)):
            Rectangle(CROQUIS40_W, CROQUIS40_H)
    extrude(amount=CORTAR_EXTRUIR36_DEPTH, mode=Mode.SUBTRACT)
    extrude(cortar_extruir36_sk.sketch, amount=-CORTAR_EXTRUIR36_DEPTH_BACK, mode=Mode.SUBTRACT)

    # Croquis41 → Cortar-Extruir37 (cut, two sides)
    with BuildSketch(Plane.XZ.offset(-20)) as cortar_extruir37_sk:
        Polygon((-19.992980133, -22.302484261), (-20, 3.75), (-24, 7.75), (-56.035110209, 7.75), align=None)
    extrude(amount=CORTAR_EXTRUIR37_DEPTH, mode=Mode.SUBTRACT)
    extrude(cortar_extruir37_sk.sketch, amount=-CORTAR_EXTRUIR37_DEPTH_BACK, mode=Mode.SUBTRACT)

    # Croquis42 → Cortar-Extruir38 (cut, two sides)
    with BuildSketch(Plane(origin=(0, 0, 9.75), x_dir=(-1, 0, 0), z_dir=(0, 0, -1))) as cortar_extruir38_sk:
        Polygon((46.720301378, 20), (46.720301378, 30), (38.825, 30), (33.492952769, 43.760628779), (49.525340398, 48.951442806), (67.200390695, 42.512205152), (65.906601328, 20), (51.713995885, 13.864168239), align=None)
    extrude(amount=CORTAR_EXTRUIR38_DEPTH, mode=Mode.SUBTRACT)
    extrude(cortar_extruir38_sk.sketch, amount=-CORTAR_EXTRUIR38_DEPTH_BACK, mode=Mode.SUBTRACT)

    # Croquis43 → Saliente-Extruir11 (add)
    with BuildSketch(Plane.XZ.offset(-20)):
        Polygon((-19.993600539, -20), (-46.720301378, 7.75), (-43.839252857, 10.524807997), (-17.112552018, -17.225192003), align=None)
    extrude(amount=-SALIENTE_EXTRUIR11_DEPTH)

    # Croquis44 → Cortar-Extruir39 (cut, through all)
    with BuildSketch(Plane(origin=(0, 0, 9.75), x_dir=(-1, 0, 0), z_dir=(0, 0, -1))):
        Polygon((38.957161657, 27.75), (37.369448416, 25), (38.957161657, 22.25), (42.132588137, 22.25), (43.720301378, 25), (42.132588137, 27.75), align=None)
    extrude(amount=CORTAR_EXTRUIR39_DEPTH, mode=Mode.SUBTRACT)

    # Croquis45 → Saliente-Extruir12 (add)
    with BuildSketch(Plane.XY.offset(12.75)):
        with Locations((-30.985150689, 25)):
            Rectangle(CROQUIS45_W, CROQUIS45_H)
        with Locations((-40.544874897, 25)):
            Circle(CROQUIS45_R, mode=Mode.SUBTRACT)
        with Locations((-29, 25)):
            Circle(CROQUIS45_R, mode=Mode.SUBTRACT)
    extrude(amount=SALIENTE_EXTRUIR12_DEPTH)

    # Croquis46 → Saliente-Extruir13 (add)
    with BuildSketch(Plane.XZ.offset(-20)):
        with BuildLine():
            Line((15.25, 0), (20, 0))
            Line((20, 0), (20, 15.25))
            Line((20, 15.25), (7.549834435, 15.25))
            Line((7.549834435, 15.25), (7.549834435, 13.25))
            ThreePointArc((7.549834435, 13.25), (13.185171124, 7.662490615), (15.25, 0))
        make_face()
        with BuildLine():
            Line((-15.25, 0), (-15.25, 15.25))
            Line((-15.25, 15.25), (-7.549834435, 15.25))
            Line((-7.549834435, 15.25), (-7.549834435, 13.25))
            ThreePointArc((-7.549834435, 13.25), (-13.185171124, 7.662490615), (-15.25, 0))
        make_face()
    extrude(amount=-SALIENTE_EXTRUIR13_DEPTH)

    # Croquis47 → Cortar-Extruir40 (cut)
    with BuildSketch(Plane.XY.offset(15.25).offset(CORTAR_EXTRUIR40_START)):
        Polygon((15.41228676, 22.352505966), (17, 25.102505966), (15.41228676, 27.852505966), (12.236860279, 27.852505966), (10.649147039, 25.102505966), (12.236860279, 22.352505966), align=None)
        with Locations((13.824573519, 25.102505966)):
            Circle(CROQUIS47_R, mode=Mode.SUBTRACT)
        Polygon((-12.236860279, 22.352505966), (-15.41228676, 22.352505966), (-17, 25.102505966), (-15.41228676, 27.852505966), (-12.236860279, 27.852505966), (-10.649147039, 25.102505966), align=None)
        with Locations(Location((-13.824573519, 25.102505966, 0), (0, 0, 131.421584744))):
            Circle(CROQUIS47_R, mode=Mode.SUBTRACT)
    extrude(amount=-CORTAR_EXTRUIR40_DEPTH, mode=Mode.SUBTRACT)

    # Croquis48 → Cortar-Extruir41 (cut)
    with BuildSketch(Plane.XY.offset(15.25).offset(CORTAR_EXTRUIR41_START)):
        with Locations((13.824573519, 25.102505966)):
            Circle(CROQUIS48_R)
        with Locations((-13.824573519, 25.102505966)):
            Circle(CROQUIS48_R)
    extrude(amount=CORTAR_EXTRUIR41_DEPTH, mode=Mode.SUBTRACT)

    # Croquis49 → Cortar-Extruir42 (cut, two sides)
    with BuildSketch(Plane.XZ.offset(-20)) as cortar_extruir42_sk:
        with Locations((-37.391633796, 1.105513491)):
            Rectangle(CROQUIS49_W, CROQUIS49_H)
    extrude(amount=CORTAR_EXTRUIR42_DEPTH, mode=Mode.SUBTRACT)
    extrude(cortar_extruir42_sk.sketch, amount=-CORTAR_EXTRUIR42_DEPTH_BACK, mode=Mode.SUBTRACT)

    # Croquis51 → Saliente-Extruir14 (add)
    with BuildSketch(Plane(origin=(0, 30, 0), x_dir=(1, 0, 0), z_dir=(0, 1, 0))):
        Circle(CROQUIS51_R)
        with Locations(Location((0, 0, 0), (0, 0, 270))):
            Circle(CROQUIS51_R_2, mode=Mode.SUBTRACT)
    extrude(amount=-SALIENTE_EXTRUIR14_DEPTH)

    # Croquis52 → Cortar-Extruir43 (cut)
    with BuildSketch(Plane(origin=(0, 0, 13.25), x_dir=(-1, 0, 0), z_dir=(0, 0, -1))):
        Polygon((-10.649147039, 25.102505966), (-12.236860279, 27.852505966), (-15.41228676, 27.852505966), (-17, 25.102505966), (-15.41228676, 22.352505966), (-12.236860279, 22.352505966), align=None)
        Polygon((17, 25.102505966), (15.41228676, 27.852505966), (12.236860279, 27.852505966), (10.649147039, 25.102505966), (12.236860279, 22.352505966), (15.41228676, 22.352505966), align=None)
    extrude(amount=CORTAR_EXTRUIR43_DEPTH, mode=Mode.SUBTRACT)

    # Croquis53 → Cortar-Extruir44 (cut)
    with BuildSketch(Plane.XY.offset(-17)):
        Polygon((3.175426481, 25), (1.58771324, 27.75), (-1.58771324, 27.75), (-3.175426481, 25), (-1.58771324, 22.25), (1.58771324, 22.25), align=None)
    extrude(amount=CORTAR_EXTRUIR44_DEPTH, mode=Mode.SUBTRACT)

    # Croquis54 → Cortar-Extruir45 (cut)
    with BuildSketch(Plane.ZY.offset(-17)):
        Polygon((-4.75, 28.175426481), (-7.5, 26.58771324), (-7.5, 23.41228676), (-4.75, 21.824573519), (-2, 23.41228676), (-2, 26.58771324), align=None)
    extrude(amount=CORTAR_EXTRUIR45_DEPTH, mode=Mode.SUBTRACT)

    # Croquis55 → Saliente-Extruir15 (add)
    with BuildSketch(Plane(origin=(0, 30, 0), x_dir=(1, 0, 0), z_dir=(0, 1, 0))):
        with BuildLine():
            Line((-7.549834435, -13.25), (-7.549834435, -15.25))
            Line((-7.549834435, -15.25), (0, -15.25))
            ThreePointArc((0, -15.25), (-3.905124838, -14.741522988), (-7.549834435, -13.25))
        make_face()
        with BuildLine():
            ThreePointArc((7.549834435, -13.25), (3.905124838, -14.741522988), (0, -15.25))
            Line((0, -15.25), (7.549834435, -15.25))
            Line((7.549834435, -15.25), (7.549834435, -13.25))
        make_face()
    extrude(amount=-SALIENTE_EXTRUIR15_DEPTH)

    # Croquis57 → Cortar-Extruir46 (cut, two sides)
    with BuildSketch(Plane.ZY.offset(27.5)) as cortar_extruir46_sk:
        with Locations((1.32598152, 23.598909176)):
            Rectangle(CROQUIS57_W, CROQUIS57_H)
    extrude(amount=CORTAR_EXTRUIR46_DEPTH, mode=Mode.SUBTRACT)
    extrude(cortar_extruir46_sk.sketch, amount=-CORTAR_EXTRUIR46_DEPTH_BACK, mode=Mode.SUBTRACT)


with BuildPart() as body_2_2_1:
    # Croquis56 → Saliente-Extruir16 (new body)
    with BuildSketch(Plane(origin=(0, 30, 0), x_dir=(1, 0, 0), z_dir=(0, 1, 0))):
        with Locations((0, 1.956478778)):
            Rectangle(CROQUIS56_W, CROQUIS56_H)
        with BuildLine():
            Line((20, -15.25), (20, 15))
            ThreePointArc((20, 15), (18.535533906, 18.535533906), (15, 20))
            Line((15, 20), (-19.993600539, 20))
            Line((-19.993600539, 20), (-19.993600539, -15.25))
            Line((-19.993600539, -15.25), (20, -15.25))
        make_face(mode=Mode.SUBTRACT)
    extrude(amount=SALIENTE_EXTRUIR16_DEPTH)

    # Croquis58 → Cortar-Extruir47 (cut)
    with BuildSketch(Plane.XZ.offset(-30)):
        with Locations(Location((-12.5, 19.25, 0), (0, 0, 270))):
            Circle(CROQUIS58_R)
        with Locations(Location((12.5, 19.25, 0), (0, 0, 270))):
            Circle(CROQUIS58_R)
        with Locations(Location((-12.5, -23.5, 0), (0, 0, 270))):
            Circle(CROQUIS58_R)
        with Locations(Location((12.5, -23.526519471, 0), (0, 0, 270))):
            Circle(CROQUIS58_R)
        with Locations(Location((-23.493600539, 10.125, 0), (0, 0, 270))):
            Circle(CROQUIS58_R)
        with Locations(Location((-23.493600539, -14.875, 0), (0, 0, 270))):
            Circle(CROQUIS58_R)
        with Locations(Location((23.493600539, -14.875, 0), (0, 0, 90))):
            Circle(CROQUIS58_R)
        with Locations(Location((23.493600539, 10.125, 0), (0, 0, 90))):
            Circle(CROQUIS58_R)
    extrude(amount=-CORTAR_EXTRUIR47_DEPTH, mode=Mode.SUBTRACT)


solid = body_2_2_1.part
